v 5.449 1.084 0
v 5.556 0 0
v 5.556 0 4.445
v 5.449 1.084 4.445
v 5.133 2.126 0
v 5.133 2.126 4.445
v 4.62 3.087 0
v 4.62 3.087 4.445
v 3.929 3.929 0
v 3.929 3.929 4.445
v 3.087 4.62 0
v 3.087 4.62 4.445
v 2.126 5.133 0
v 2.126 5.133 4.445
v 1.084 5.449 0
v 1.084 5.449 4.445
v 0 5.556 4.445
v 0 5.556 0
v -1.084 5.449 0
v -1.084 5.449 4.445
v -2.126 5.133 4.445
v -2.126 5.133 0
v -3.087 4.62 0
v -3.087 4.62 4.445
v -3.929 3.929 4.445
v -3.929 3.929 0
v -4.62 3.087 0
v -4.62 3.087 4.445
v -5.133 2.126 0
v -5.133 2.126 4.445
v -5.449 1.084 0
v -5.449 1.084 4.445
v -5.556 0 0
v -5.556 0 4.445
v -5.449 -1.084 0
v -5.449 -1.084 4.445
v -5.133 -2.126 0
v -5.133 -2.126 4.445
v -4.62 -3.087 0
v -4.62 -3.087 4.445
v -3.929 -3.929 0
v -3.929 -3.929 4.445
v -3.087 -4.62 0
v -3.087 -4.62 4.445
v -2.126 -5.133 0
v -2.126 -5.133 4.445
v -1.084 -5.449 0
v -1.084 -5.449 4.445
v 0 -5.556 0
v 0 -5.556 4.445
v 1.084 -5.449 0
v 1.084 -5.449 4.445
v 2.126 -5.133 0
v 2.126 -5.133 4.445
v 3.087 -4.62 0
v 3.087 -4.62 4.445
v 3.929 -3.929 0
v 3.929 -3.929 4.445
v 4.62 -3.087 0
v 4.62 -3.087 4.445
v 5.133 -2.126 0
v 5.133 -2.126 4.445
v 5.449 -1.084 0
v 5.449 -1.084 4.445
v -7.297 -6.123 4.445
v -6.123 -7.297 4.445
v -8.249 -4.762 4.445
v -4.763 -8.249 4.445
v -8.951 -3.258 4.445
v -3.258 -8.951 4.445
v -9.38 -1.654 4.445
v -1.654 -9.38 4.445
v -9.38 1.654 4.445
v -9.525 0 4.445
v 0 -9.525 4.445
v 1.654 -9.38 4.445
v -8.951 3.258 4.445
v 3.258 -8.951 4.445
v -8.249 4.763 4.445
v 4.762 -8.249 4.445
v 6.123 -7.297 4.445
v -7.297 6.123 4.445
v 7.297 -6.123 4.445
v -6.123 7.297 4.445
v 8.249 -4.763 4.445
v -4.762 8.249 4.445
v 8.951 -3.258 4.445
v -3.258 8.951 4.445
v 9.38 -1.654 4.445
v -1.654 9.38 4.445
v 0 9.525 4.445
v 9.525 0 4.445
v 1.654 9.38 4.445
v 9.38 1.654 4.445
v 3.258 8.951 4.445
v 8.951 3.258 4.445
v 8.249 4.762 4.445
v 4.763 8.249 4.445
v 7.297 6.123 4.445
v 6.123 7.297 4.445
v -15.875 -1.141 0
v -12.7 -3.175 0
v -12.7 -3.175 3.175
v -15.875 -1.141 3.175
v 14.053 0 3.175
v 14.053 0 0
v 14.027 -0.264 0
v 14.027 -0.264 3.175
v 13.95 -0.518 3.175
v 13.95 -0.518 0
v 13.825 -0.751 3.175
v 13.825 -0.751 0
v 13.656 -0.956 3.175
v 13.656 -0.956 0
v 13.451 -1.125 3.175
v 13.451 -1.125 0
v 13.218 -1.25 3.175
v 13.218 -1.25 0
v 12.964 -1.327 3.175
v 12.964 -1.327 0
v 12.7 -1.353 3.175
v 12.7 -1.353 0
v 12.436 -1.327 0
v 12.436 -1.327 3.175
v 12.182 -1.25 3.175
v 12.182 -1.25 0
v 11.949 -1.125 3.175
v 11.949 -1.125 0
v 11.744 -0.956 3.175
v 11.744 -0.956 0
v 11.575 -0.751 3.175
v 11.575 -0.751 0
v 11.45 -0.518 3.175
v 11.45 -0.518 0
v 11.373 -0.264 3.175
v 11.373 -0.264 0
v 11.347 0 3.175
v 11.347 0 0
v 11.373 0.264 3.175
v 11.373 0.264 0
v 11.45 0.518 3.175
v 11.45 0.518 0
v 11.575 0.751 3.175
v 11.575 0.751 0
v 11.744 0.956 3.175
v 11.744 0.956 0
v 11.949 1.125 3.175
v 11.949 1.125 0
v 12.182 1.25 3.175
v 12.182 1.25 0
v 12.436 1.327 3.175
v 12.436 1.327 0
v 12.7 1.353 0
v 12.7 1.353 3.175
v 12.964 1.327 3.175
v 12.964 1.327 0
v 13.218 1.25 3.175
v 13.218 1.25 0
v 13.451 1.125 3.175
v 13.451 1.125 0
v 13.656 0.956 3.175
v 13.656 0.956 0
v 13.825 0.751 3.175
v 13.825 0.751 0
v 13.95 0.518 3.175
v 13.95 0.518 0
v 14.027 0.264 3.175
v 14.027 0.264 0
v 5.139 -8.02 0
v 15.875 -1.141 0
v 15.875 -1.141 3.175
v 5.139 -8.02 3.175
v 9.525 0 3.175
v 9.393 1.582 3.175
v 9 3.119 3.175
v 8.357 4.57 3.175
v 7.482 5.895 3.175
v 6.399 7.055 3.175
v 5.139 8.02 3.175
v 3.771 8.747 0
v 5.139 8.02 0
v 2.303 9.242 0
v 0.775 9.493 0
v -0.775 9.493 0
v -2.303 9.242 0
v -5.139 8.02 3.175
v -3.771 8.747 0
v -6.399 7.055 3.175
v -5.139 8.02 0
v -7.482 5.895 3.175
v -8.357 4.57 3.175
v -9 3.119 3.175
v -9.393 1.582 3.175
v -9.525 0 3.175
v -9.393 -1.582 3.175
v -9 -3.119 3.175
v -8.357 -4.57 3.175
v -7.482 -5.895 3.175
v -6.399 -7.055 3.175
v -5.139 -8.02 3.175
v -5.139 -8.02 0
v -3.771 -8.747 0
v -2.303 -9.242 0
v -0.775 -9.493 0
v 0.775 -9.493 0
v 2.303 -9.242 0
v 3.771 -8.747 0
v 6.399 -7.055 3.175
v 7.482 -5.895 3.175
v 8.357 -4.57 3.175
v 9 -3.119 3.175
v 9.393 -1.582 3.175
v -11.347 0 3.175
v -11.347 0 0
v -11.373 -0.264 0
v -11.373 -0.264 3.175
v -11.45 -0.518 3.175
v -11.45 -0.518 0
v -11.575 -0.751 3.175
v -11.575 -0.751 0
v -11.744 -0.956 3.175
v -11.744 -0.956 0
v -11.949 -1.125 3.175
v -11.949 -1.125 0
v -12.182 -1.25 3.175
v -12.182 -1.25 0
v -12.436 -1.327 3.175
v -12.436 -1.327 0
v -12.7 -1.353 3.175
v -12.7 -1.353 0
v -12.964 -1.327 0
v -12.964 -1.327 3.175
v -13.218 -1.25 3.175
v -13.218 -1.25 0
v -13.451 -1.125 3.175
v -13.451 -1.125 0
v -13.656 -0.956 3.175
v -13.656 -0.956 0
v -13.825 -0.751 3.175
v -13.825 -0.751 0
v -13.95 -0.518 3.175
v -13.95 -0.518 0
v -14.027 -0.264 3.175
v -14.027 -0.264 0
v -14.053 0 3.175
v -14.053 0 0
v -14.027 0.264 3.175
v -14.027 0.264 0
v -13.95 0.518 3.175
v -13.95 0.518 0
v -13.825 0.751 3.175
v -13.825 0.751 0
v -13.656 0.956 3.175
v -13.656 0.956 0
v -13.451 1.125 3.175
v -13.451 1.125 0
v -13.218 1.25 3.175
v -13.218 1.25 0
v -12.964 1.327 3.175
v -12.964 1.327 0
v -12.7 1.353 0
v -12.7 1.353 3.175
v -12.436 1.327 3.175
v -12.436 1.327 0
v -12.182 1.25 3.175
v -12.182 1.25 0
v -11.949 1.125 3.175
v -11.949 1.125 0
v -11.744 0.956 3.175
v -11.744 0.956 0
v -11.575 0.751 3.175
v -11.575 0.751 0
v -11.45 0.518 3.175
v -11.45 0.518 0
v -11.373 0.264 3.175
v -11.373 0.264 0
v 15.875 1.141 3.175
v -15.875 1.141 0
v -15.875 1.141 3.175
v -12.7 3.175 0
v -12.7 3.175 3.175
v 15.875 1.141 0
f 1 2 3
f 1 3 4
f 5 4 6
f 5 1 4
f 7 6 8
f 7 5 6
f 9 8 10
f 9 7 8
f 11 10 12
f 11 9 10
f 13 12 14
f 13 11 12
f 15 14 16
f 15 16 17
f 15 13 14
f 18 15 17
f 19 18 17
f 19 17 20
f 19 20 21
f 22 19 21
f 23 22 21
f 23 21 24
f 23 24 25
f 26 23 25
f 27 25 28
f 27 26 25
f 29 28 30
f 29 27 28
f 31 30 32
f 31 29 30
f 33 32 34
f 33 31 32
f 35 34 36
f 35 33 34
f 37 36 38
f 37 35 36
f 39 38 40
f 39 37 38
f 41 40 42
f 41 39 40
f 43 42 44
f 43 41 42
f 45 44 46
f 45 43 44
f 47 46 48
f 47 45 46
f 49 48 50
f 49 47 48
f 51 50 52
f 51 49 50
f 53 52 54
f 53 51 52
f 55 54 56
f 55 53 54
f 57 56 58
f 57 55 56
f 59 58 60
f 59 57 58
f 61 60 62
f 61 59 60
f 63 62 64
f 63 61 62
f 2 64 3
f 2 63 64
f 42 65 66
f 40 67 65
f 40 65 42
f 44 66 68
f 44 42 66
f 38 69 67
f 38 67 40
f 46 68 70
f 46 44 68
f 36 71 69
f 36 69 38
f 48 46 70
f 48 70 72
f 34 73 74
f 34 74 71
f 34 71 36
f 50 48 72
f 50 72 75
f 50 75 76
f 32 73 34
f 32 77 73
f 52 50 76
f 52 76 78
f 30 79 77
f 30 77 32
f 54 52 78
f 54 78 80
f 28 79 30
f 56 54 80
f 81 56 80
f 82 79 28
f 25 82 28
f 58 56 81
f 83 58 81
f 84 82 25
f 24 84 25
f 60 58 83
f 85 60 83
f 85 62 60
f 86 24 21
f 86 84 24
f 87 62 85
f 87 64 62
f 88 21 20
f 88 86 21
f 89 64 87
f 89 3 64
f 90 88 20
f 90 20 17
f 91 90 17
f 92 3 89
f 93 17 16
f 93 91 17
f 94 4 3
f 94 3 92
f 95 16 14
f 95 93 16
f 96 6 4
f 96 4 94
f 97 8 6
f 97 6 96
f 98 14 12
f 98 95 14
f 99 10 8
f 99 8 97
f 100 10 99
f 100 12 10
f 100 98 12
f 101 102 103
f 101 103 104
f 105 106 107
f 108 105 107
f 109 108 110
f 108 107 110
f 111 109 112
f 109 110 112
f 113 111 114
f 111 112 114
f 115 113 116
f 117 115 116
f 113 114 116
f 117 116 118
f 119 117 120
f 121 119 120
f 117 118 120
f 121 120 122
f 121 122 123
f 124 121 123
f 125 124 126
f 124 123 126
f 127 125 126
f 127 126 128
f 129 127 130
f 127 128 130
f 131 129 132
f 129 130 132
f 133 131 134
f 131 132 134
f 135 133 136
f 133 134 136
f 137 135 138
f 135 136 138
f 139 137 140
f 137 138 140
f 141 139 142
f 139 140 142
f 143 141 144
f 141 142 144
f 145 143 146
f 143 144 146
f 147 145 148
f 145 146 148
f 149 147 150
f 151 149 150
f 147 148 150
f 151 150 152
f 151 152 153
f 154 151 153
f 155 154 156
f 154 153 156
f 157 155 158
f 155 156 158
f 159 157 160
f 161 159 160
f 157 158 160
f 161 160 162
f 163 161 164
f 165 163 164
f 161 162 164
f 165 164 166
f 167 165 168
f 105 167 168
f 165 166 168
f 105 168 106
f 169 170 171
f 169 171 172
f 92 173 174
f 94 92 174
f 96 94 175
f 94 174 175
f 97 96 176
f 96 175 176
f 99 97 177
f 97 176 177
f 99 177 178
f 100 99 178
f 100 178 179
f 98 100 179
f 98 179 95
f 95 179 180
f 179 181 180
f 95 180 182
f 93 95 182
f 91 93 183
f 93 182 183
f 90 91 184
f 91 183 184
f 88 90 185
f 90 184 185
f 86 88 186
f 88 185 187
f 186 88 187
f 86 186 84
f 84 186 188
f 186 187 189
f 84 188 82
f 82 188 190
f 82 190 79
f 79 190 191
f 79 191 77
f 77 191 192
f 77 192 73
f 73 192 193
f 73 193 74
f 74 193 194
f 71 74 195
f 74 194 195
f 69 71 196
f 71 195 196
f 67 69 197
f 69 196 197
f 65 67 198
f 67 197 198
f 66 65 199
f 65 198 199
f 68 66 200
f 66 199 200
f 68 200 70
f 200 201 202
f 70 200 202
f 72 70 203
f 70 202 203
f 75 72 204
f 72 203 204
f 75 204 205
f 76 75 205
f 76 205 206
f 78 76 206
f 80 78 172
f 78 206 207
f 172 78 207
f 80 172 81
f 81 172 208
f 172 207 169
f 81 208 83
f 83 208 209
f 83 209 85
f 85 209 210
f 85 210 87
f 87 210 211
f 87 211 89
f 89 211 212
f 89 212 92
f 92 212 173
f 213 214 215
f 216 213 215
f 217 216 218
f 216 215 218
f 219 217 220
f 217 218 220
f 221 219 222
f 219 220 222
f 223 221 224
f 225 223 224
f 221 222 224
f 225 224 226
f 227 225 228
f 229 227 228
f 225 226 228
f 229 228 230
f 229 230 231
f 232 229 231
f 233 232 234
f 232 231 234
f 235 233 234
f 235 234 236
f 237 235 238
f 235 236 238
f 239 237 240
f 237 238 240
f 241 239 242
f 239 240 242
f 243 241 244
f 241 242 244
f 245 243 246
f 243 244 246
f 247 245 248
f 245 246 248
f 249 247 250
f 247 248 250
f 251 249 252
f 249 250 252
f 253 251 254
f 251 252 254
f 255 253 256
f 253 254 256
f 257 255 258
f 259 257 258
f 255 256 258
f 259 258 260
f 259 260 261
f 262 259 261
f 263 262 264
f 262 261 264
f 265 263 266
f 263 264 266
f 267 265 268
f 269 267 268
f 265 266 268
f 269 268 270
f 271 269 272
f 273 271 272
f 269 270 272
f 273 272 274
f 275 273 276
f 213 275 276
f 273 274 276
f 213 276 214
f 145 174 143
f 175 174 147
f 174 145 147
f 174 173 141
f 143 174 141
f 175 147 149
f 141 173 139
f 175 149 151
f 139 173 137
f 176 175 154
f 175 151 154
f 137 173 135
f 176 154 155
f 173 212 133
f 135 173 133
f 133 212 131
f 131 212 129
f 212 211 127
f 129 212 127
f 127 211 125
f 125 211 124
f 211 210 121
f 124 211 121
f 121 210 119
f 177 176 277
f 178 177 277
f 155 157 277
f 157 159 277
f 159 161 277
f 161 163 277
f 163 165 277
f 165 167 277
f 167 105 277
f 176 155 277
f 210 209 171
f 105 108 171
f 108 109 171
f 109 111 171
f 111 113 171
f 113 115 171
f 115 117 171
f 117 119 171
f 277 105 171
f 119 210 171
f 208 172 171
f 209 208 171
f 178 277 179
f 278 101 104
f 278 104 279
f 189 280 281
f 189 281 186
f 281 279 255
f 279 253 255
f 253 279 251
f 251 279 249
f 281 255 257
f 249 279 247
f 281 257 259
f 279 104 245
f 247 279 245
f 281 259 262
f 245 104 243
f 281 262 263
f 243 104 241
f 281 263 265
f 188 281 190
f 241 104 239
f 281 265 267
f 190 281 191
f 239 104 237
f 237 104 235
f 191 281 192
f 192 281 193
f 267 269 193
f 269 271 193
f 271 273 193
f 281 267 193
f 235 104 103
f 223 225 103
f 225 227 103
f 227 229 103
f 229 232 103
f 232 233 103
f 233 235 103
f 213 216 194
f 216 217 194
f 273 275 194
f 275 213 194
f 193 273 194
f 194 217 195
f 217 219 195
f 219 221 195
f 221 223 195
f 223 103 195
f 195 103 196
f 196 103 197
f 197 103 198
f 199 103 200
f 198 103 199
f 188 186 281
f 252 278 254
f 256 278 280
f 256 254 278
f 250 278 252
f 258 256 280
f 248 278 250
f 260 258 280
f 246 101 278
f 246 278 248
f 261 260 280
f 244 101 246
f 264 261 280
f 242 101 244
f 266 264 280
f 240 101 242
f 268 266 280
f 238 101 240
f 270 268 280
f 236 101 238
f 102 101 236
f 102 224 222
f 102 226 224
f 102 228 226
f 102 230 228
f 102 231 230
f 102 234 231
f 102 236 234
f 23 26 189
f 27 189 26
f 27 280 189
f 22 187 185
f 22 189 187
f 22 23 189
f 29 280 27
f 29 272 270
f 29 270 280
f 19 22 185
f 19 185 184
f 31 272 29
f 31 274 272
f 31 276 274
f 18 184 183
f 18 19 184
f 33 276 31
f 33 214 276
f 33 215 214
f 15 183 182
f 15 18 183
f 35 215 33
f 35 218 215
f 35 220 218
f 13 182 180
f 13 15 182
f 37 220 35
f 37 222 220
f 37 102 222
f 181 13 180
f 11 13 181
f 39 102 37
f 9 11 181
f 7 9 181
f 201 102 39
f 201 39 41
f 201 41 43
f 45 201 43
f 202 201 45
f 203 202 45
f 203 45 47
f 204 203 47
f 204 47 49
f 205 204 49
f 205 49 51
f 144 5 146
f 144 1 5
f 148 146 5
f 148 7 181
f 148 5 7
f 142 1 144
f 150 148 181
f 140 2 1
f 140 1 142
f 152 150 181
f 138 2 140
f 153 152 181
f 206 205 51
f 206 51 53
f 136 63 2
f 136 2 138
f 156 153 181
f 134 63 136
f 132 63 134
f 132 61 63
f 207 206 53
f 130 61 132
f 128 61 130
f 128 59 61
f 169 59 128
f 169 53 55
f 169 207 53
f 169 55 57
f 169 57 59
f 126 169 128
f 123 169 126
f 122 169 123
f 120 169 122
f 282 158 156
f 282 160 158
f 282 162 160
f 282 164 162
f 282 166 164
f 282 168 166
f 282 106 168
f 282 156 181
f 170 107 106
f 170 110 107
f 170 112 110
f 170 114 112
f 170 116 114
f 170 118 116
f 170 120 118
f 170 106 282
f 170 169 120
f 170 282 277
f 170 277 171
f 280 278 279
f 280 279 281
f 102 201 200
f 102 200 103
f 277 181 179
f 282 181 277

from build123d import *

# Parameters (mm, degrees)
F0_R     = 9.525
F0_R_2   = 5.55625
F1_DEPTH = 4.445
F2_R     = 1.35255
F3_DEPTH = 3.175


with BuildPart() as f1:
    # F0 (on Top) → F1 (new body)
    with BuildSketch(Plane.XY):
        Circle(F0_R)
        Circle(F0_R_2, mode=Mode.SUBTRACT)
    extrude(amount=F1_DEPTH)

    # F2 (on face) → F3 (join)
    with BuildSketch(Plane(origin=(0, 0, 0), x_dir=(1, 0, 0), z_dir=(0, 0, -1))):
        with BuildLine():
            Line((-5.1387783316, 8.0198866737), (-12.7, 3.175))
            Line((-12.7, 3.175), (-15.875, 1.1406045195))
            Line((-15.875, 1.1406045195), (-15.875, -1.1406045195))
            Line((-15.875, -1.1406045195), (-12.7, -3.175))
            Line((-12.7, -3.175), (-5.1387783316, -8.0198866737))
            ThreePointArc((-5.1387783316, -8.0198866737), (-9.525, 0), (-5.1387783316, 8.0198866737))
        make_face()
        with Locations((-12.7, 0)):
            Circle(F2_R, mode=Mode.SUBTRACT)
        with BuildLine():
            Line((15.875, 1.1406045195), (5.1387783316, 8.0198866737))
            ThreePointArc((5.1387783316, 8.0198866737), (8.3568082606, 4.570490203), (9.525, 0))
            ThreePointArc((9.525, 0), (8.3568082606, -4.570490203), (5.1387783316, -8.0198866737))
            Line((5.1387783316, -8.0198866737), (15.875, -1.1406045195))
            Line((15.875, -1.1406045195), (15.875, 1.1406045195))
        make_face()
        with Locations((12.7, 0)):
            Circle(F2_R, mode=Mode.SUBTRACT)
    extrude(amount=-F3_DEPTH)


solid = f1.part
